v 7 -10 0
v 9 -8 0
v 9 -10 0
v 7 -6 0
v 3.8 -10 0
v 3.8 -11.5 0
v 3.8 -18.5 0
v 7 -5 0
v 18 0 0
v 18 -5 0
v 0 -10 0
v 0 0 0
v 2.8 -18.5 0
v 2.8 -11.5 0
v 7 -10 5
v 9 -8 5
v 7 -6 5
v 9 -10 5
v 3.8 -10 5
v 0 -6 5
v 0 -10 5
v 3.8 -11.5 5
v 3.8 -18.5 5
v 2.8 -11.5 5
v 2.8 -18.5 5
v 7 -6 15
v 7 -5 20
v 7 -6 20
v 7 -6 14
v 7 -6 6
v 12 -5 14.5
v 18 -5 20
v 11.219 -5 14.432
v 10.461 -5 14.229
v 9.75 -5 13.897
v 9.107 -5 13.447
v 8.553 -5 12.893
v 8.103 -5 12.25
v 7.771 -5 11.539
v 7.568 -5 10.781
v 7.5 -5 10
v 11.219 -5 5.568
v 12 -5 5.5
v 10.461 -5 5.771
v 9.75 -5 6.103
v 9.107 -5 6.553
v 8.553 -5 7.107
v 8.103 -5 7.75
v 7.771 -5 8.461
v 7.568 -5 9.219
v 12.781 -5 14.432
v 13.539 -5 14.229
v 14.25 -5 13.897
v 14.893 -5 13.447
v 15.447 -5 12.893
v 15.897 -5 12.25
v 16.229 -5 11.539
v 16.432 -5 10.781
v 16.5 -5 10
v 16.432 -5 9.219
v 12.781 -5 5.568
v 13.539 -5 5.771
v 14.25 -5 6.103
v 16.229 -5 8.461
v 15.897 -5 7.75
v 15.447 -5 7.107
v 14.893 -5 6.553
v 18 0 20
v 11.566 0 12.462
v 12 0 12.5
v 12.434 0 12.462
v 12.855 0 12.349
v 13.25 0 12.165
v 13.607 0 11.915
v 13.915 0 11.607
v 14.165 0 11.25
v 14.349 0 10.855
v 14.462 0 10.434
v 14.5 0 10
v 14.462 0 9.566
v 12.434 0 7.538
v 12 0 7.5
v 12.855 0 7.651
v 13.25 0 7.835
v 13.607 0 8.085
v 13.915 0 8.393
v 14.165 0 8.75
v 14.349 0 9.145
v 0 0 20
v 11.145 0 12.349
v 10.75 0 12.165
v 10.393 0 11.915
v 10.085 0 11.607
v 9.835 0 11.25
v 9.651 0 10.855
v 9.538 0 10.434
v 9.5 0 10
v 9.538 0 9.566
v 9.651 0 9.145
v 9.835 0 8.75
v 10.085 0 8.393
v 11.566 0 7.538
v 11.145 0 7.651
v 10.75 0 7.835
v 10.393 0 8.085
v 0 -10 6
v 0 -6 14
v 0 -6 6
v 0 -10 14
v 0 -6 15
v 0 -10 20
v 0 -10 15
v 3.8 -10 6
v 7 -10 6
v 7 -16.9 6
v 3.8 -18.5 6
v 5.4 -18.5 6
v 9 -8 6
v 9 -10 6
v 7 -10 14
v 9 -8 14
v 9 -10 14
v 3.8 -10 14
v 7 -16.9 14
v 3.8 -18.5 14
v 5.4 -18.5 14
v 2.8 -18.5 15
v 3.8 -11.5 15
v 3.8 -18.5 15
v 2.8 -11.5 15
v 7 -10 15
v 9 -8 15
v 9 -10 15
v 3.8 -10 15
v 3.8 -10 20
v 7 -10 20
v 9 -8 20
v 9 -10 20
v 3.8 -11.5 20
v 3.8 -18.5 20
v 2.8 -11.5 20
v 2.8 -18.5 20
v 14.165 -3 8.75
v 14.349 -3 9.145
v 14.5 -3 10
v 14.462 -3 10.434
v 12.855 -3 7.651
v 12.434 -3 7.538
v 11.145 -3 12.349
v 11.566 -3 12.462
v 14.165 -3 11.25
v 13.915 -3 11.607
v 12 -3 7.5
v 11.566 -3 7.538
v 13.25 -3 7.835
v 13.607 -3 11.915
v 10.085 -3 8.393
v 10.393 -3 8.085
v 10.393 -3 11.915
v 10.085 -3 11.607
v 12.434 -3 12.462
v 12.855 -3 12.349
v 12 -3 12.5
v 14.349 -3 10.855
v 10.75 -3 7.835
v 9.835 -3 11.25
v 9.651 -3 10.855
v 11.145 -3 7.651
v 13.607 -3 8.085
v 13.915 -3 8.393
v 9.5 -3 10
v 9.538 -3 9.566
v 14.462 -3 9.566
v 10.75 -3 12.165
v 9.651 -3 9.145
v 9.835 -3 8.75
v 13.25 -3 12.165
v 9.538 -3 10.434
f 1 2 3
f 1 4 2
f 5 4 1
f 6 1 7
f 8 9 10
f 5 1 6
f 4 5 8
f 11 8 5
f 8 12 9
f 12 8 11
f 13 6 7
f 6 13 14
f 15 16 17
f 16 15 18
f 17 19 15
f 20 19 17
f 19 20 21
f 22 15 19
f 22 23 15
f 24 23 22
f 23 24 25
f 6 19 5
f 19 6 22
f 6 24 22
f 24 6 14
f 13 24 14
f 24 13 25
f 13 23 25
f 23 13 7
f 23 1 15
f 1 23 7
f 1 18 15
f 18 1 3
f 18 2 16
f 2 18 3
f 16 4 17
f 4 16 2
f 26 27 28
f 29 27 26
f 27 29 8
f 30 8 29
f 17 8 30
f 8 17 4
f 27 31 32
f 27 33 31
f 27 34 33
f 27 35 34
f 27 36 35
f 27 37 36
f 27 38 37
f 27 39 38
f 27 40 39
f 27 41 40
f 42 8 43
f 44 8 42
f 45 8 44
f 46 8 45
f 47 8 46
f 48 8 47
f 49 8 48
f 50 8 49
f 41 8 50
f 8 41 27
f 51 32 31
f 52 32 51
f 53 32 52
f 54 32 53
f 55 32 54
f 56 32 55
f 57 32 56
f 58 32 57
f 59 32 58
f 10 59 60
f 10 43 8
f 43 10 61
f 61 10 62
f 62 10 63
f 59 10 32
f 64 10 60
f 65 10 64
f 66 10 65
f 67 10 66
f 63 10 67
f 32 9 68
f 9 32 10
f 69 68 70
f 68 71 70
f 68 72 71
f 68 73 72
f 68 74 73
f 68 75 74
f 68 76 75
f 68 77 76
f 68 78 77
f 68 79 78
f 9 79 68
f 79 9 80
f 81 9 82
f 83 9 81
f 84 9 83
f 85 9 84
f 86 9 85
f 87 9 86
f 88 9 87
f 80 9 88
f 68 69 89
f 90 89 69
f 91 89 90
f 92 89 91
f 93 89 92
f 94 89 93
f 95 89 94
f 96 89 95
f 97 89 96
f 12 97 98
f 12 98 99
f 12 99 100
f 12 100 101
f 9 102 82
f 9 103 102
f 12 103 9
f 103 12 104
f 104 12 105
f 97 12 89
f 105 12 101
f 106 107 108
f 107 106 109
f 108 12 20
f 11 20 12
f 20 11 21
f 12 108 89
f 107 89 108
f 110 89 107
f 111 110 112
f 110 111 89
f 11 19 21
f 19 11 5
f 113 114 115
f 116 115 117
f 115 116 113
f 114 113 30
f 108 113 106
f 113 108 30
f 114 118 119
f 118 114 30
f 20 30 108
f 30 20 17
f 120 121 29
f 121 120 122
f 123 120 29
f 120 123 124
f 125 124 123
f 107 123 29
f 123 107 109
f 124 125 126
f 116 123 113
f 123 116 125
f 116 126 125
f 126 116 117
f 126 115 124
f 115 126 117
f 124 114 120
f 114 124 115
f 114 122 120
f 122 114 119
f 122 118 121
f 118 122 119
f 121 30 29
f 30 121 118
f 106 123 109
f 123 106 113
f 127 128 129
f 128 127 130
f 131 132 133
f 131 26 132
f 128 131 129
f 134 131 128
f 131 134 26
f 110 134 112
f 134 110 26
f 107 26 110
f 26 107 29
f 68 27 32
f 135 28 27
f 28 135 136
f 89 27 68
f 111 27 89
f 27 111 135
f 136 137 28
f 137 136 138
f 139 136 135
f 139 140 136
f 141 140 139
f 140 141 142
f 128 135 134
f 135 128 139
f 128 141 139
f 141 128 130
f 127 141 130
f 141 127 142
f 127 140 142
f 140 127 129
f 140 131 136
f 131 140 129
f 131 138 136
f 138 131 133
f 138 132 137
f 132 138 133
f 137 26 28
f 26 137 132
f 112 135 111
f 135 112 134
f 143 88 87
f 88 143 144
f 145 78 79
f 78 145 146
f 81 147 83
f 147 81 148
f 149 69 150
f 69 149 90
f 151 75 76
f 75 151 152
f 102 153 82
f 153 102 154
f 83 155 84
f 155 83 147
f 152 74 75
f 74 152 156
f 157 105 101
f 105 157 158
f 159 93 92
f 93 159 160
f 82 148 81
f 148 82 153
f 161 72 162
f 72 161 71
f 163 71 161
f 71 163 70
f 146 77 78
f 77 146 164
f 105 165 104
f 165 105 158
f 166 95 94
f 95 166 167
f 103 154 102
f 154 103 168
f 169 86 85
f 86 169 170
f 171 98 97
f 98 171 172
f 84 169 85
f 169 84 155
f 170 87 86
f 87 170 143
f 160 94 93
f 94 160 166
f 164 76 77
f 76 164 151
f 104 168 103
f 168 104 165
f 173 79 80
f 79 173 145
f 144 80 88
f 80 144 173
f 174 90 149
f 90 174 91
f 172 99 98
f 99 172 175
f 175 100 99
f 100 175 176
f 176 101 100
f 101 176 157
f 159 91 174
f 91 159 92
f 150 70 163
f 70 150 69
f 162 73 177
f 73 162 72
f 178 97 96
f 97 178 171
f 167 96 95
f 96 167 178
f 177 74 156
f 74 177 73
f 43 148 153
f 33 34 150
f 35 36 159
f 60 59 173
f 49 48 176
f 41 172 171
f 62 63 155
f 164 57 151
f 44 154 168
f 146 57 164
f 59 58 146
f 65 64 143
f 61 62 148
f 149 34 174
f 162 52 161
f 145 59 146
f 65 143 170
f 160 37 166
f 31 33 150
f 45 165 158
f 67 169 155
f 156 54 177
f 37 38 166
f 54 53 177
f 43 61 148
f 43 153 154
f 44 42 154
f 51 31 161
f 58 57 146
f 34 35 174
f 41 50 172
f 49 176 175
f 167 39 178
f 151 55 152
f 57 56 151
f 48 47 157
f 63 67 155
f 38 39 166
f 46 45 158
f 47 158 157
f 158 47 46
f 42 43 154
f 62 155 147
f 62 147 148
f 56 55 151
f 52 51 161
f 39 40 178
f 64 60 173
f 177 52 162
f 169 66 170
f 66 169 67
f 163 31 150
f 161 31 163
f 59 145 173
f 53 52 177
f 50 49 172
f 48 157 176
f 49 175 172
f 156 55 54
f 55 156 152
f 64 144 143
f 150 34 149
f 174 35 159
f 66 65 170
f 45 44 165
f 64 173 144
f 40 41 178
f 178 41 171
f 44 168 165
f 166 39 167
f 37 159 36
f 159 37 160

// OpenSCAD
/*

  <l4=5 >
  xxxxxxx ^
  xxxxxxx |
  xxxxxxx |
  xxxxxxx |
  xxxxxxx - - - - dia = 5       5     + h2 = 11
  xxxxxxx |                    <l>    |
  xxxxxxx |                    xxx       ^
  xxxxxxx | h3 = 11           xxxx       + h4 = 2
  xxxxxxx v                  xxxxx       v
  xxxxxxxxxxxxxxxxxxxxxxxxxxxxxxxxxxxxxxxx      ^   ^
  xxxxxxxxxxxxxxxxxxxxxxxxxxxxxxxxxxxxxxxxxx    |   | gap = 3.2
  xxxxxxxxxxxxxxxxxxxxxxxxxxxxxxxxxxxxxxxxxxxx  |   v  
  xxxxxxxxxxxxxxxxxxxxxxxxxxxxxxxx       xxxxx  |   ] ind =   1.0
  xxxxxxxxxxxxxxxxxxxxxxxxxxxxxxxx    |         | h1 = 7
  xxxxxxxxxxxxxxxxxxxxxxxxxxxxxxxx    +         v
  
  <----------- l1 = 21 ----------><- l2 = 9 ->
                                         <l3 >  
*/

e = 0.4;

h1 = 7;
h2 = 12;
h3 = 11;
h4 = 2;
l2 = 8.5;
l3 = 7;
l4 = 5;
l5 = 2;
gap = 3.2;
ind = 1.0;
dia = 5;
taper=2;

//l1 = 21;
l1 = 10;

height = 20;

outline1 = [[0,0],[l1,0],[l1,h1-gap],
           [l1+l2-l3,h1-gap],[l1+l2-l3,h1-gap-ind],[l1+l2,h1-gap-ind],[l1+l2,h1-gap],
           [l1,h1],[l1,h1+h4],[l1-l5,h1+h4],[l1-l5-h4,h1],[l4,h1],[l4,h1+h3],[0,h1+h3] ];
outline2 = [[0,0],[l1,0],[l1,h1-gap],
           [l1+l2,h1-gap],[l1+l2,h1-gap/2],[l1+l2-gap/2,h1],/*[l1+l2,h1], */
           [l1,h1],[l1,h1+h4],[l1-l5,h1+h4],[l1-l5-h4,h1],[l4,h1],[l4,h1+h3],[0,h1+h3] ];
outline3 = [[0,0],[l1-l5-h4,0],
           [l1-l5-h4,h1],[l4,h1],[l4,h1+h3],[0,h1+h3] ];

rotate([0,0,-90])difference(){
    union(){
        translate([0,0, 0])linear_extrude(5)polygon(outline1);
        translate([0,0, 5])linear_extrude(1)polygon(outline3);
        translate([0,0, 6])linear_extrude(8)polygon(outline2);
        translate([0,0,14])linear_extrude(1)polygon(outline3);
        translate([0,0,15])linear_extrude(5)polygon(outline1);
    }
    translate([0,h2,height/2])rotate([0,90,0])cylinder(h=l4-taper,d=dia,$fn=36);
    translate([l4-taper,h2,height/2])rotate([0,90,0])cylinder(h=taper,d1=dia,d2=dia+2*taper,$fn=36);
}
  
